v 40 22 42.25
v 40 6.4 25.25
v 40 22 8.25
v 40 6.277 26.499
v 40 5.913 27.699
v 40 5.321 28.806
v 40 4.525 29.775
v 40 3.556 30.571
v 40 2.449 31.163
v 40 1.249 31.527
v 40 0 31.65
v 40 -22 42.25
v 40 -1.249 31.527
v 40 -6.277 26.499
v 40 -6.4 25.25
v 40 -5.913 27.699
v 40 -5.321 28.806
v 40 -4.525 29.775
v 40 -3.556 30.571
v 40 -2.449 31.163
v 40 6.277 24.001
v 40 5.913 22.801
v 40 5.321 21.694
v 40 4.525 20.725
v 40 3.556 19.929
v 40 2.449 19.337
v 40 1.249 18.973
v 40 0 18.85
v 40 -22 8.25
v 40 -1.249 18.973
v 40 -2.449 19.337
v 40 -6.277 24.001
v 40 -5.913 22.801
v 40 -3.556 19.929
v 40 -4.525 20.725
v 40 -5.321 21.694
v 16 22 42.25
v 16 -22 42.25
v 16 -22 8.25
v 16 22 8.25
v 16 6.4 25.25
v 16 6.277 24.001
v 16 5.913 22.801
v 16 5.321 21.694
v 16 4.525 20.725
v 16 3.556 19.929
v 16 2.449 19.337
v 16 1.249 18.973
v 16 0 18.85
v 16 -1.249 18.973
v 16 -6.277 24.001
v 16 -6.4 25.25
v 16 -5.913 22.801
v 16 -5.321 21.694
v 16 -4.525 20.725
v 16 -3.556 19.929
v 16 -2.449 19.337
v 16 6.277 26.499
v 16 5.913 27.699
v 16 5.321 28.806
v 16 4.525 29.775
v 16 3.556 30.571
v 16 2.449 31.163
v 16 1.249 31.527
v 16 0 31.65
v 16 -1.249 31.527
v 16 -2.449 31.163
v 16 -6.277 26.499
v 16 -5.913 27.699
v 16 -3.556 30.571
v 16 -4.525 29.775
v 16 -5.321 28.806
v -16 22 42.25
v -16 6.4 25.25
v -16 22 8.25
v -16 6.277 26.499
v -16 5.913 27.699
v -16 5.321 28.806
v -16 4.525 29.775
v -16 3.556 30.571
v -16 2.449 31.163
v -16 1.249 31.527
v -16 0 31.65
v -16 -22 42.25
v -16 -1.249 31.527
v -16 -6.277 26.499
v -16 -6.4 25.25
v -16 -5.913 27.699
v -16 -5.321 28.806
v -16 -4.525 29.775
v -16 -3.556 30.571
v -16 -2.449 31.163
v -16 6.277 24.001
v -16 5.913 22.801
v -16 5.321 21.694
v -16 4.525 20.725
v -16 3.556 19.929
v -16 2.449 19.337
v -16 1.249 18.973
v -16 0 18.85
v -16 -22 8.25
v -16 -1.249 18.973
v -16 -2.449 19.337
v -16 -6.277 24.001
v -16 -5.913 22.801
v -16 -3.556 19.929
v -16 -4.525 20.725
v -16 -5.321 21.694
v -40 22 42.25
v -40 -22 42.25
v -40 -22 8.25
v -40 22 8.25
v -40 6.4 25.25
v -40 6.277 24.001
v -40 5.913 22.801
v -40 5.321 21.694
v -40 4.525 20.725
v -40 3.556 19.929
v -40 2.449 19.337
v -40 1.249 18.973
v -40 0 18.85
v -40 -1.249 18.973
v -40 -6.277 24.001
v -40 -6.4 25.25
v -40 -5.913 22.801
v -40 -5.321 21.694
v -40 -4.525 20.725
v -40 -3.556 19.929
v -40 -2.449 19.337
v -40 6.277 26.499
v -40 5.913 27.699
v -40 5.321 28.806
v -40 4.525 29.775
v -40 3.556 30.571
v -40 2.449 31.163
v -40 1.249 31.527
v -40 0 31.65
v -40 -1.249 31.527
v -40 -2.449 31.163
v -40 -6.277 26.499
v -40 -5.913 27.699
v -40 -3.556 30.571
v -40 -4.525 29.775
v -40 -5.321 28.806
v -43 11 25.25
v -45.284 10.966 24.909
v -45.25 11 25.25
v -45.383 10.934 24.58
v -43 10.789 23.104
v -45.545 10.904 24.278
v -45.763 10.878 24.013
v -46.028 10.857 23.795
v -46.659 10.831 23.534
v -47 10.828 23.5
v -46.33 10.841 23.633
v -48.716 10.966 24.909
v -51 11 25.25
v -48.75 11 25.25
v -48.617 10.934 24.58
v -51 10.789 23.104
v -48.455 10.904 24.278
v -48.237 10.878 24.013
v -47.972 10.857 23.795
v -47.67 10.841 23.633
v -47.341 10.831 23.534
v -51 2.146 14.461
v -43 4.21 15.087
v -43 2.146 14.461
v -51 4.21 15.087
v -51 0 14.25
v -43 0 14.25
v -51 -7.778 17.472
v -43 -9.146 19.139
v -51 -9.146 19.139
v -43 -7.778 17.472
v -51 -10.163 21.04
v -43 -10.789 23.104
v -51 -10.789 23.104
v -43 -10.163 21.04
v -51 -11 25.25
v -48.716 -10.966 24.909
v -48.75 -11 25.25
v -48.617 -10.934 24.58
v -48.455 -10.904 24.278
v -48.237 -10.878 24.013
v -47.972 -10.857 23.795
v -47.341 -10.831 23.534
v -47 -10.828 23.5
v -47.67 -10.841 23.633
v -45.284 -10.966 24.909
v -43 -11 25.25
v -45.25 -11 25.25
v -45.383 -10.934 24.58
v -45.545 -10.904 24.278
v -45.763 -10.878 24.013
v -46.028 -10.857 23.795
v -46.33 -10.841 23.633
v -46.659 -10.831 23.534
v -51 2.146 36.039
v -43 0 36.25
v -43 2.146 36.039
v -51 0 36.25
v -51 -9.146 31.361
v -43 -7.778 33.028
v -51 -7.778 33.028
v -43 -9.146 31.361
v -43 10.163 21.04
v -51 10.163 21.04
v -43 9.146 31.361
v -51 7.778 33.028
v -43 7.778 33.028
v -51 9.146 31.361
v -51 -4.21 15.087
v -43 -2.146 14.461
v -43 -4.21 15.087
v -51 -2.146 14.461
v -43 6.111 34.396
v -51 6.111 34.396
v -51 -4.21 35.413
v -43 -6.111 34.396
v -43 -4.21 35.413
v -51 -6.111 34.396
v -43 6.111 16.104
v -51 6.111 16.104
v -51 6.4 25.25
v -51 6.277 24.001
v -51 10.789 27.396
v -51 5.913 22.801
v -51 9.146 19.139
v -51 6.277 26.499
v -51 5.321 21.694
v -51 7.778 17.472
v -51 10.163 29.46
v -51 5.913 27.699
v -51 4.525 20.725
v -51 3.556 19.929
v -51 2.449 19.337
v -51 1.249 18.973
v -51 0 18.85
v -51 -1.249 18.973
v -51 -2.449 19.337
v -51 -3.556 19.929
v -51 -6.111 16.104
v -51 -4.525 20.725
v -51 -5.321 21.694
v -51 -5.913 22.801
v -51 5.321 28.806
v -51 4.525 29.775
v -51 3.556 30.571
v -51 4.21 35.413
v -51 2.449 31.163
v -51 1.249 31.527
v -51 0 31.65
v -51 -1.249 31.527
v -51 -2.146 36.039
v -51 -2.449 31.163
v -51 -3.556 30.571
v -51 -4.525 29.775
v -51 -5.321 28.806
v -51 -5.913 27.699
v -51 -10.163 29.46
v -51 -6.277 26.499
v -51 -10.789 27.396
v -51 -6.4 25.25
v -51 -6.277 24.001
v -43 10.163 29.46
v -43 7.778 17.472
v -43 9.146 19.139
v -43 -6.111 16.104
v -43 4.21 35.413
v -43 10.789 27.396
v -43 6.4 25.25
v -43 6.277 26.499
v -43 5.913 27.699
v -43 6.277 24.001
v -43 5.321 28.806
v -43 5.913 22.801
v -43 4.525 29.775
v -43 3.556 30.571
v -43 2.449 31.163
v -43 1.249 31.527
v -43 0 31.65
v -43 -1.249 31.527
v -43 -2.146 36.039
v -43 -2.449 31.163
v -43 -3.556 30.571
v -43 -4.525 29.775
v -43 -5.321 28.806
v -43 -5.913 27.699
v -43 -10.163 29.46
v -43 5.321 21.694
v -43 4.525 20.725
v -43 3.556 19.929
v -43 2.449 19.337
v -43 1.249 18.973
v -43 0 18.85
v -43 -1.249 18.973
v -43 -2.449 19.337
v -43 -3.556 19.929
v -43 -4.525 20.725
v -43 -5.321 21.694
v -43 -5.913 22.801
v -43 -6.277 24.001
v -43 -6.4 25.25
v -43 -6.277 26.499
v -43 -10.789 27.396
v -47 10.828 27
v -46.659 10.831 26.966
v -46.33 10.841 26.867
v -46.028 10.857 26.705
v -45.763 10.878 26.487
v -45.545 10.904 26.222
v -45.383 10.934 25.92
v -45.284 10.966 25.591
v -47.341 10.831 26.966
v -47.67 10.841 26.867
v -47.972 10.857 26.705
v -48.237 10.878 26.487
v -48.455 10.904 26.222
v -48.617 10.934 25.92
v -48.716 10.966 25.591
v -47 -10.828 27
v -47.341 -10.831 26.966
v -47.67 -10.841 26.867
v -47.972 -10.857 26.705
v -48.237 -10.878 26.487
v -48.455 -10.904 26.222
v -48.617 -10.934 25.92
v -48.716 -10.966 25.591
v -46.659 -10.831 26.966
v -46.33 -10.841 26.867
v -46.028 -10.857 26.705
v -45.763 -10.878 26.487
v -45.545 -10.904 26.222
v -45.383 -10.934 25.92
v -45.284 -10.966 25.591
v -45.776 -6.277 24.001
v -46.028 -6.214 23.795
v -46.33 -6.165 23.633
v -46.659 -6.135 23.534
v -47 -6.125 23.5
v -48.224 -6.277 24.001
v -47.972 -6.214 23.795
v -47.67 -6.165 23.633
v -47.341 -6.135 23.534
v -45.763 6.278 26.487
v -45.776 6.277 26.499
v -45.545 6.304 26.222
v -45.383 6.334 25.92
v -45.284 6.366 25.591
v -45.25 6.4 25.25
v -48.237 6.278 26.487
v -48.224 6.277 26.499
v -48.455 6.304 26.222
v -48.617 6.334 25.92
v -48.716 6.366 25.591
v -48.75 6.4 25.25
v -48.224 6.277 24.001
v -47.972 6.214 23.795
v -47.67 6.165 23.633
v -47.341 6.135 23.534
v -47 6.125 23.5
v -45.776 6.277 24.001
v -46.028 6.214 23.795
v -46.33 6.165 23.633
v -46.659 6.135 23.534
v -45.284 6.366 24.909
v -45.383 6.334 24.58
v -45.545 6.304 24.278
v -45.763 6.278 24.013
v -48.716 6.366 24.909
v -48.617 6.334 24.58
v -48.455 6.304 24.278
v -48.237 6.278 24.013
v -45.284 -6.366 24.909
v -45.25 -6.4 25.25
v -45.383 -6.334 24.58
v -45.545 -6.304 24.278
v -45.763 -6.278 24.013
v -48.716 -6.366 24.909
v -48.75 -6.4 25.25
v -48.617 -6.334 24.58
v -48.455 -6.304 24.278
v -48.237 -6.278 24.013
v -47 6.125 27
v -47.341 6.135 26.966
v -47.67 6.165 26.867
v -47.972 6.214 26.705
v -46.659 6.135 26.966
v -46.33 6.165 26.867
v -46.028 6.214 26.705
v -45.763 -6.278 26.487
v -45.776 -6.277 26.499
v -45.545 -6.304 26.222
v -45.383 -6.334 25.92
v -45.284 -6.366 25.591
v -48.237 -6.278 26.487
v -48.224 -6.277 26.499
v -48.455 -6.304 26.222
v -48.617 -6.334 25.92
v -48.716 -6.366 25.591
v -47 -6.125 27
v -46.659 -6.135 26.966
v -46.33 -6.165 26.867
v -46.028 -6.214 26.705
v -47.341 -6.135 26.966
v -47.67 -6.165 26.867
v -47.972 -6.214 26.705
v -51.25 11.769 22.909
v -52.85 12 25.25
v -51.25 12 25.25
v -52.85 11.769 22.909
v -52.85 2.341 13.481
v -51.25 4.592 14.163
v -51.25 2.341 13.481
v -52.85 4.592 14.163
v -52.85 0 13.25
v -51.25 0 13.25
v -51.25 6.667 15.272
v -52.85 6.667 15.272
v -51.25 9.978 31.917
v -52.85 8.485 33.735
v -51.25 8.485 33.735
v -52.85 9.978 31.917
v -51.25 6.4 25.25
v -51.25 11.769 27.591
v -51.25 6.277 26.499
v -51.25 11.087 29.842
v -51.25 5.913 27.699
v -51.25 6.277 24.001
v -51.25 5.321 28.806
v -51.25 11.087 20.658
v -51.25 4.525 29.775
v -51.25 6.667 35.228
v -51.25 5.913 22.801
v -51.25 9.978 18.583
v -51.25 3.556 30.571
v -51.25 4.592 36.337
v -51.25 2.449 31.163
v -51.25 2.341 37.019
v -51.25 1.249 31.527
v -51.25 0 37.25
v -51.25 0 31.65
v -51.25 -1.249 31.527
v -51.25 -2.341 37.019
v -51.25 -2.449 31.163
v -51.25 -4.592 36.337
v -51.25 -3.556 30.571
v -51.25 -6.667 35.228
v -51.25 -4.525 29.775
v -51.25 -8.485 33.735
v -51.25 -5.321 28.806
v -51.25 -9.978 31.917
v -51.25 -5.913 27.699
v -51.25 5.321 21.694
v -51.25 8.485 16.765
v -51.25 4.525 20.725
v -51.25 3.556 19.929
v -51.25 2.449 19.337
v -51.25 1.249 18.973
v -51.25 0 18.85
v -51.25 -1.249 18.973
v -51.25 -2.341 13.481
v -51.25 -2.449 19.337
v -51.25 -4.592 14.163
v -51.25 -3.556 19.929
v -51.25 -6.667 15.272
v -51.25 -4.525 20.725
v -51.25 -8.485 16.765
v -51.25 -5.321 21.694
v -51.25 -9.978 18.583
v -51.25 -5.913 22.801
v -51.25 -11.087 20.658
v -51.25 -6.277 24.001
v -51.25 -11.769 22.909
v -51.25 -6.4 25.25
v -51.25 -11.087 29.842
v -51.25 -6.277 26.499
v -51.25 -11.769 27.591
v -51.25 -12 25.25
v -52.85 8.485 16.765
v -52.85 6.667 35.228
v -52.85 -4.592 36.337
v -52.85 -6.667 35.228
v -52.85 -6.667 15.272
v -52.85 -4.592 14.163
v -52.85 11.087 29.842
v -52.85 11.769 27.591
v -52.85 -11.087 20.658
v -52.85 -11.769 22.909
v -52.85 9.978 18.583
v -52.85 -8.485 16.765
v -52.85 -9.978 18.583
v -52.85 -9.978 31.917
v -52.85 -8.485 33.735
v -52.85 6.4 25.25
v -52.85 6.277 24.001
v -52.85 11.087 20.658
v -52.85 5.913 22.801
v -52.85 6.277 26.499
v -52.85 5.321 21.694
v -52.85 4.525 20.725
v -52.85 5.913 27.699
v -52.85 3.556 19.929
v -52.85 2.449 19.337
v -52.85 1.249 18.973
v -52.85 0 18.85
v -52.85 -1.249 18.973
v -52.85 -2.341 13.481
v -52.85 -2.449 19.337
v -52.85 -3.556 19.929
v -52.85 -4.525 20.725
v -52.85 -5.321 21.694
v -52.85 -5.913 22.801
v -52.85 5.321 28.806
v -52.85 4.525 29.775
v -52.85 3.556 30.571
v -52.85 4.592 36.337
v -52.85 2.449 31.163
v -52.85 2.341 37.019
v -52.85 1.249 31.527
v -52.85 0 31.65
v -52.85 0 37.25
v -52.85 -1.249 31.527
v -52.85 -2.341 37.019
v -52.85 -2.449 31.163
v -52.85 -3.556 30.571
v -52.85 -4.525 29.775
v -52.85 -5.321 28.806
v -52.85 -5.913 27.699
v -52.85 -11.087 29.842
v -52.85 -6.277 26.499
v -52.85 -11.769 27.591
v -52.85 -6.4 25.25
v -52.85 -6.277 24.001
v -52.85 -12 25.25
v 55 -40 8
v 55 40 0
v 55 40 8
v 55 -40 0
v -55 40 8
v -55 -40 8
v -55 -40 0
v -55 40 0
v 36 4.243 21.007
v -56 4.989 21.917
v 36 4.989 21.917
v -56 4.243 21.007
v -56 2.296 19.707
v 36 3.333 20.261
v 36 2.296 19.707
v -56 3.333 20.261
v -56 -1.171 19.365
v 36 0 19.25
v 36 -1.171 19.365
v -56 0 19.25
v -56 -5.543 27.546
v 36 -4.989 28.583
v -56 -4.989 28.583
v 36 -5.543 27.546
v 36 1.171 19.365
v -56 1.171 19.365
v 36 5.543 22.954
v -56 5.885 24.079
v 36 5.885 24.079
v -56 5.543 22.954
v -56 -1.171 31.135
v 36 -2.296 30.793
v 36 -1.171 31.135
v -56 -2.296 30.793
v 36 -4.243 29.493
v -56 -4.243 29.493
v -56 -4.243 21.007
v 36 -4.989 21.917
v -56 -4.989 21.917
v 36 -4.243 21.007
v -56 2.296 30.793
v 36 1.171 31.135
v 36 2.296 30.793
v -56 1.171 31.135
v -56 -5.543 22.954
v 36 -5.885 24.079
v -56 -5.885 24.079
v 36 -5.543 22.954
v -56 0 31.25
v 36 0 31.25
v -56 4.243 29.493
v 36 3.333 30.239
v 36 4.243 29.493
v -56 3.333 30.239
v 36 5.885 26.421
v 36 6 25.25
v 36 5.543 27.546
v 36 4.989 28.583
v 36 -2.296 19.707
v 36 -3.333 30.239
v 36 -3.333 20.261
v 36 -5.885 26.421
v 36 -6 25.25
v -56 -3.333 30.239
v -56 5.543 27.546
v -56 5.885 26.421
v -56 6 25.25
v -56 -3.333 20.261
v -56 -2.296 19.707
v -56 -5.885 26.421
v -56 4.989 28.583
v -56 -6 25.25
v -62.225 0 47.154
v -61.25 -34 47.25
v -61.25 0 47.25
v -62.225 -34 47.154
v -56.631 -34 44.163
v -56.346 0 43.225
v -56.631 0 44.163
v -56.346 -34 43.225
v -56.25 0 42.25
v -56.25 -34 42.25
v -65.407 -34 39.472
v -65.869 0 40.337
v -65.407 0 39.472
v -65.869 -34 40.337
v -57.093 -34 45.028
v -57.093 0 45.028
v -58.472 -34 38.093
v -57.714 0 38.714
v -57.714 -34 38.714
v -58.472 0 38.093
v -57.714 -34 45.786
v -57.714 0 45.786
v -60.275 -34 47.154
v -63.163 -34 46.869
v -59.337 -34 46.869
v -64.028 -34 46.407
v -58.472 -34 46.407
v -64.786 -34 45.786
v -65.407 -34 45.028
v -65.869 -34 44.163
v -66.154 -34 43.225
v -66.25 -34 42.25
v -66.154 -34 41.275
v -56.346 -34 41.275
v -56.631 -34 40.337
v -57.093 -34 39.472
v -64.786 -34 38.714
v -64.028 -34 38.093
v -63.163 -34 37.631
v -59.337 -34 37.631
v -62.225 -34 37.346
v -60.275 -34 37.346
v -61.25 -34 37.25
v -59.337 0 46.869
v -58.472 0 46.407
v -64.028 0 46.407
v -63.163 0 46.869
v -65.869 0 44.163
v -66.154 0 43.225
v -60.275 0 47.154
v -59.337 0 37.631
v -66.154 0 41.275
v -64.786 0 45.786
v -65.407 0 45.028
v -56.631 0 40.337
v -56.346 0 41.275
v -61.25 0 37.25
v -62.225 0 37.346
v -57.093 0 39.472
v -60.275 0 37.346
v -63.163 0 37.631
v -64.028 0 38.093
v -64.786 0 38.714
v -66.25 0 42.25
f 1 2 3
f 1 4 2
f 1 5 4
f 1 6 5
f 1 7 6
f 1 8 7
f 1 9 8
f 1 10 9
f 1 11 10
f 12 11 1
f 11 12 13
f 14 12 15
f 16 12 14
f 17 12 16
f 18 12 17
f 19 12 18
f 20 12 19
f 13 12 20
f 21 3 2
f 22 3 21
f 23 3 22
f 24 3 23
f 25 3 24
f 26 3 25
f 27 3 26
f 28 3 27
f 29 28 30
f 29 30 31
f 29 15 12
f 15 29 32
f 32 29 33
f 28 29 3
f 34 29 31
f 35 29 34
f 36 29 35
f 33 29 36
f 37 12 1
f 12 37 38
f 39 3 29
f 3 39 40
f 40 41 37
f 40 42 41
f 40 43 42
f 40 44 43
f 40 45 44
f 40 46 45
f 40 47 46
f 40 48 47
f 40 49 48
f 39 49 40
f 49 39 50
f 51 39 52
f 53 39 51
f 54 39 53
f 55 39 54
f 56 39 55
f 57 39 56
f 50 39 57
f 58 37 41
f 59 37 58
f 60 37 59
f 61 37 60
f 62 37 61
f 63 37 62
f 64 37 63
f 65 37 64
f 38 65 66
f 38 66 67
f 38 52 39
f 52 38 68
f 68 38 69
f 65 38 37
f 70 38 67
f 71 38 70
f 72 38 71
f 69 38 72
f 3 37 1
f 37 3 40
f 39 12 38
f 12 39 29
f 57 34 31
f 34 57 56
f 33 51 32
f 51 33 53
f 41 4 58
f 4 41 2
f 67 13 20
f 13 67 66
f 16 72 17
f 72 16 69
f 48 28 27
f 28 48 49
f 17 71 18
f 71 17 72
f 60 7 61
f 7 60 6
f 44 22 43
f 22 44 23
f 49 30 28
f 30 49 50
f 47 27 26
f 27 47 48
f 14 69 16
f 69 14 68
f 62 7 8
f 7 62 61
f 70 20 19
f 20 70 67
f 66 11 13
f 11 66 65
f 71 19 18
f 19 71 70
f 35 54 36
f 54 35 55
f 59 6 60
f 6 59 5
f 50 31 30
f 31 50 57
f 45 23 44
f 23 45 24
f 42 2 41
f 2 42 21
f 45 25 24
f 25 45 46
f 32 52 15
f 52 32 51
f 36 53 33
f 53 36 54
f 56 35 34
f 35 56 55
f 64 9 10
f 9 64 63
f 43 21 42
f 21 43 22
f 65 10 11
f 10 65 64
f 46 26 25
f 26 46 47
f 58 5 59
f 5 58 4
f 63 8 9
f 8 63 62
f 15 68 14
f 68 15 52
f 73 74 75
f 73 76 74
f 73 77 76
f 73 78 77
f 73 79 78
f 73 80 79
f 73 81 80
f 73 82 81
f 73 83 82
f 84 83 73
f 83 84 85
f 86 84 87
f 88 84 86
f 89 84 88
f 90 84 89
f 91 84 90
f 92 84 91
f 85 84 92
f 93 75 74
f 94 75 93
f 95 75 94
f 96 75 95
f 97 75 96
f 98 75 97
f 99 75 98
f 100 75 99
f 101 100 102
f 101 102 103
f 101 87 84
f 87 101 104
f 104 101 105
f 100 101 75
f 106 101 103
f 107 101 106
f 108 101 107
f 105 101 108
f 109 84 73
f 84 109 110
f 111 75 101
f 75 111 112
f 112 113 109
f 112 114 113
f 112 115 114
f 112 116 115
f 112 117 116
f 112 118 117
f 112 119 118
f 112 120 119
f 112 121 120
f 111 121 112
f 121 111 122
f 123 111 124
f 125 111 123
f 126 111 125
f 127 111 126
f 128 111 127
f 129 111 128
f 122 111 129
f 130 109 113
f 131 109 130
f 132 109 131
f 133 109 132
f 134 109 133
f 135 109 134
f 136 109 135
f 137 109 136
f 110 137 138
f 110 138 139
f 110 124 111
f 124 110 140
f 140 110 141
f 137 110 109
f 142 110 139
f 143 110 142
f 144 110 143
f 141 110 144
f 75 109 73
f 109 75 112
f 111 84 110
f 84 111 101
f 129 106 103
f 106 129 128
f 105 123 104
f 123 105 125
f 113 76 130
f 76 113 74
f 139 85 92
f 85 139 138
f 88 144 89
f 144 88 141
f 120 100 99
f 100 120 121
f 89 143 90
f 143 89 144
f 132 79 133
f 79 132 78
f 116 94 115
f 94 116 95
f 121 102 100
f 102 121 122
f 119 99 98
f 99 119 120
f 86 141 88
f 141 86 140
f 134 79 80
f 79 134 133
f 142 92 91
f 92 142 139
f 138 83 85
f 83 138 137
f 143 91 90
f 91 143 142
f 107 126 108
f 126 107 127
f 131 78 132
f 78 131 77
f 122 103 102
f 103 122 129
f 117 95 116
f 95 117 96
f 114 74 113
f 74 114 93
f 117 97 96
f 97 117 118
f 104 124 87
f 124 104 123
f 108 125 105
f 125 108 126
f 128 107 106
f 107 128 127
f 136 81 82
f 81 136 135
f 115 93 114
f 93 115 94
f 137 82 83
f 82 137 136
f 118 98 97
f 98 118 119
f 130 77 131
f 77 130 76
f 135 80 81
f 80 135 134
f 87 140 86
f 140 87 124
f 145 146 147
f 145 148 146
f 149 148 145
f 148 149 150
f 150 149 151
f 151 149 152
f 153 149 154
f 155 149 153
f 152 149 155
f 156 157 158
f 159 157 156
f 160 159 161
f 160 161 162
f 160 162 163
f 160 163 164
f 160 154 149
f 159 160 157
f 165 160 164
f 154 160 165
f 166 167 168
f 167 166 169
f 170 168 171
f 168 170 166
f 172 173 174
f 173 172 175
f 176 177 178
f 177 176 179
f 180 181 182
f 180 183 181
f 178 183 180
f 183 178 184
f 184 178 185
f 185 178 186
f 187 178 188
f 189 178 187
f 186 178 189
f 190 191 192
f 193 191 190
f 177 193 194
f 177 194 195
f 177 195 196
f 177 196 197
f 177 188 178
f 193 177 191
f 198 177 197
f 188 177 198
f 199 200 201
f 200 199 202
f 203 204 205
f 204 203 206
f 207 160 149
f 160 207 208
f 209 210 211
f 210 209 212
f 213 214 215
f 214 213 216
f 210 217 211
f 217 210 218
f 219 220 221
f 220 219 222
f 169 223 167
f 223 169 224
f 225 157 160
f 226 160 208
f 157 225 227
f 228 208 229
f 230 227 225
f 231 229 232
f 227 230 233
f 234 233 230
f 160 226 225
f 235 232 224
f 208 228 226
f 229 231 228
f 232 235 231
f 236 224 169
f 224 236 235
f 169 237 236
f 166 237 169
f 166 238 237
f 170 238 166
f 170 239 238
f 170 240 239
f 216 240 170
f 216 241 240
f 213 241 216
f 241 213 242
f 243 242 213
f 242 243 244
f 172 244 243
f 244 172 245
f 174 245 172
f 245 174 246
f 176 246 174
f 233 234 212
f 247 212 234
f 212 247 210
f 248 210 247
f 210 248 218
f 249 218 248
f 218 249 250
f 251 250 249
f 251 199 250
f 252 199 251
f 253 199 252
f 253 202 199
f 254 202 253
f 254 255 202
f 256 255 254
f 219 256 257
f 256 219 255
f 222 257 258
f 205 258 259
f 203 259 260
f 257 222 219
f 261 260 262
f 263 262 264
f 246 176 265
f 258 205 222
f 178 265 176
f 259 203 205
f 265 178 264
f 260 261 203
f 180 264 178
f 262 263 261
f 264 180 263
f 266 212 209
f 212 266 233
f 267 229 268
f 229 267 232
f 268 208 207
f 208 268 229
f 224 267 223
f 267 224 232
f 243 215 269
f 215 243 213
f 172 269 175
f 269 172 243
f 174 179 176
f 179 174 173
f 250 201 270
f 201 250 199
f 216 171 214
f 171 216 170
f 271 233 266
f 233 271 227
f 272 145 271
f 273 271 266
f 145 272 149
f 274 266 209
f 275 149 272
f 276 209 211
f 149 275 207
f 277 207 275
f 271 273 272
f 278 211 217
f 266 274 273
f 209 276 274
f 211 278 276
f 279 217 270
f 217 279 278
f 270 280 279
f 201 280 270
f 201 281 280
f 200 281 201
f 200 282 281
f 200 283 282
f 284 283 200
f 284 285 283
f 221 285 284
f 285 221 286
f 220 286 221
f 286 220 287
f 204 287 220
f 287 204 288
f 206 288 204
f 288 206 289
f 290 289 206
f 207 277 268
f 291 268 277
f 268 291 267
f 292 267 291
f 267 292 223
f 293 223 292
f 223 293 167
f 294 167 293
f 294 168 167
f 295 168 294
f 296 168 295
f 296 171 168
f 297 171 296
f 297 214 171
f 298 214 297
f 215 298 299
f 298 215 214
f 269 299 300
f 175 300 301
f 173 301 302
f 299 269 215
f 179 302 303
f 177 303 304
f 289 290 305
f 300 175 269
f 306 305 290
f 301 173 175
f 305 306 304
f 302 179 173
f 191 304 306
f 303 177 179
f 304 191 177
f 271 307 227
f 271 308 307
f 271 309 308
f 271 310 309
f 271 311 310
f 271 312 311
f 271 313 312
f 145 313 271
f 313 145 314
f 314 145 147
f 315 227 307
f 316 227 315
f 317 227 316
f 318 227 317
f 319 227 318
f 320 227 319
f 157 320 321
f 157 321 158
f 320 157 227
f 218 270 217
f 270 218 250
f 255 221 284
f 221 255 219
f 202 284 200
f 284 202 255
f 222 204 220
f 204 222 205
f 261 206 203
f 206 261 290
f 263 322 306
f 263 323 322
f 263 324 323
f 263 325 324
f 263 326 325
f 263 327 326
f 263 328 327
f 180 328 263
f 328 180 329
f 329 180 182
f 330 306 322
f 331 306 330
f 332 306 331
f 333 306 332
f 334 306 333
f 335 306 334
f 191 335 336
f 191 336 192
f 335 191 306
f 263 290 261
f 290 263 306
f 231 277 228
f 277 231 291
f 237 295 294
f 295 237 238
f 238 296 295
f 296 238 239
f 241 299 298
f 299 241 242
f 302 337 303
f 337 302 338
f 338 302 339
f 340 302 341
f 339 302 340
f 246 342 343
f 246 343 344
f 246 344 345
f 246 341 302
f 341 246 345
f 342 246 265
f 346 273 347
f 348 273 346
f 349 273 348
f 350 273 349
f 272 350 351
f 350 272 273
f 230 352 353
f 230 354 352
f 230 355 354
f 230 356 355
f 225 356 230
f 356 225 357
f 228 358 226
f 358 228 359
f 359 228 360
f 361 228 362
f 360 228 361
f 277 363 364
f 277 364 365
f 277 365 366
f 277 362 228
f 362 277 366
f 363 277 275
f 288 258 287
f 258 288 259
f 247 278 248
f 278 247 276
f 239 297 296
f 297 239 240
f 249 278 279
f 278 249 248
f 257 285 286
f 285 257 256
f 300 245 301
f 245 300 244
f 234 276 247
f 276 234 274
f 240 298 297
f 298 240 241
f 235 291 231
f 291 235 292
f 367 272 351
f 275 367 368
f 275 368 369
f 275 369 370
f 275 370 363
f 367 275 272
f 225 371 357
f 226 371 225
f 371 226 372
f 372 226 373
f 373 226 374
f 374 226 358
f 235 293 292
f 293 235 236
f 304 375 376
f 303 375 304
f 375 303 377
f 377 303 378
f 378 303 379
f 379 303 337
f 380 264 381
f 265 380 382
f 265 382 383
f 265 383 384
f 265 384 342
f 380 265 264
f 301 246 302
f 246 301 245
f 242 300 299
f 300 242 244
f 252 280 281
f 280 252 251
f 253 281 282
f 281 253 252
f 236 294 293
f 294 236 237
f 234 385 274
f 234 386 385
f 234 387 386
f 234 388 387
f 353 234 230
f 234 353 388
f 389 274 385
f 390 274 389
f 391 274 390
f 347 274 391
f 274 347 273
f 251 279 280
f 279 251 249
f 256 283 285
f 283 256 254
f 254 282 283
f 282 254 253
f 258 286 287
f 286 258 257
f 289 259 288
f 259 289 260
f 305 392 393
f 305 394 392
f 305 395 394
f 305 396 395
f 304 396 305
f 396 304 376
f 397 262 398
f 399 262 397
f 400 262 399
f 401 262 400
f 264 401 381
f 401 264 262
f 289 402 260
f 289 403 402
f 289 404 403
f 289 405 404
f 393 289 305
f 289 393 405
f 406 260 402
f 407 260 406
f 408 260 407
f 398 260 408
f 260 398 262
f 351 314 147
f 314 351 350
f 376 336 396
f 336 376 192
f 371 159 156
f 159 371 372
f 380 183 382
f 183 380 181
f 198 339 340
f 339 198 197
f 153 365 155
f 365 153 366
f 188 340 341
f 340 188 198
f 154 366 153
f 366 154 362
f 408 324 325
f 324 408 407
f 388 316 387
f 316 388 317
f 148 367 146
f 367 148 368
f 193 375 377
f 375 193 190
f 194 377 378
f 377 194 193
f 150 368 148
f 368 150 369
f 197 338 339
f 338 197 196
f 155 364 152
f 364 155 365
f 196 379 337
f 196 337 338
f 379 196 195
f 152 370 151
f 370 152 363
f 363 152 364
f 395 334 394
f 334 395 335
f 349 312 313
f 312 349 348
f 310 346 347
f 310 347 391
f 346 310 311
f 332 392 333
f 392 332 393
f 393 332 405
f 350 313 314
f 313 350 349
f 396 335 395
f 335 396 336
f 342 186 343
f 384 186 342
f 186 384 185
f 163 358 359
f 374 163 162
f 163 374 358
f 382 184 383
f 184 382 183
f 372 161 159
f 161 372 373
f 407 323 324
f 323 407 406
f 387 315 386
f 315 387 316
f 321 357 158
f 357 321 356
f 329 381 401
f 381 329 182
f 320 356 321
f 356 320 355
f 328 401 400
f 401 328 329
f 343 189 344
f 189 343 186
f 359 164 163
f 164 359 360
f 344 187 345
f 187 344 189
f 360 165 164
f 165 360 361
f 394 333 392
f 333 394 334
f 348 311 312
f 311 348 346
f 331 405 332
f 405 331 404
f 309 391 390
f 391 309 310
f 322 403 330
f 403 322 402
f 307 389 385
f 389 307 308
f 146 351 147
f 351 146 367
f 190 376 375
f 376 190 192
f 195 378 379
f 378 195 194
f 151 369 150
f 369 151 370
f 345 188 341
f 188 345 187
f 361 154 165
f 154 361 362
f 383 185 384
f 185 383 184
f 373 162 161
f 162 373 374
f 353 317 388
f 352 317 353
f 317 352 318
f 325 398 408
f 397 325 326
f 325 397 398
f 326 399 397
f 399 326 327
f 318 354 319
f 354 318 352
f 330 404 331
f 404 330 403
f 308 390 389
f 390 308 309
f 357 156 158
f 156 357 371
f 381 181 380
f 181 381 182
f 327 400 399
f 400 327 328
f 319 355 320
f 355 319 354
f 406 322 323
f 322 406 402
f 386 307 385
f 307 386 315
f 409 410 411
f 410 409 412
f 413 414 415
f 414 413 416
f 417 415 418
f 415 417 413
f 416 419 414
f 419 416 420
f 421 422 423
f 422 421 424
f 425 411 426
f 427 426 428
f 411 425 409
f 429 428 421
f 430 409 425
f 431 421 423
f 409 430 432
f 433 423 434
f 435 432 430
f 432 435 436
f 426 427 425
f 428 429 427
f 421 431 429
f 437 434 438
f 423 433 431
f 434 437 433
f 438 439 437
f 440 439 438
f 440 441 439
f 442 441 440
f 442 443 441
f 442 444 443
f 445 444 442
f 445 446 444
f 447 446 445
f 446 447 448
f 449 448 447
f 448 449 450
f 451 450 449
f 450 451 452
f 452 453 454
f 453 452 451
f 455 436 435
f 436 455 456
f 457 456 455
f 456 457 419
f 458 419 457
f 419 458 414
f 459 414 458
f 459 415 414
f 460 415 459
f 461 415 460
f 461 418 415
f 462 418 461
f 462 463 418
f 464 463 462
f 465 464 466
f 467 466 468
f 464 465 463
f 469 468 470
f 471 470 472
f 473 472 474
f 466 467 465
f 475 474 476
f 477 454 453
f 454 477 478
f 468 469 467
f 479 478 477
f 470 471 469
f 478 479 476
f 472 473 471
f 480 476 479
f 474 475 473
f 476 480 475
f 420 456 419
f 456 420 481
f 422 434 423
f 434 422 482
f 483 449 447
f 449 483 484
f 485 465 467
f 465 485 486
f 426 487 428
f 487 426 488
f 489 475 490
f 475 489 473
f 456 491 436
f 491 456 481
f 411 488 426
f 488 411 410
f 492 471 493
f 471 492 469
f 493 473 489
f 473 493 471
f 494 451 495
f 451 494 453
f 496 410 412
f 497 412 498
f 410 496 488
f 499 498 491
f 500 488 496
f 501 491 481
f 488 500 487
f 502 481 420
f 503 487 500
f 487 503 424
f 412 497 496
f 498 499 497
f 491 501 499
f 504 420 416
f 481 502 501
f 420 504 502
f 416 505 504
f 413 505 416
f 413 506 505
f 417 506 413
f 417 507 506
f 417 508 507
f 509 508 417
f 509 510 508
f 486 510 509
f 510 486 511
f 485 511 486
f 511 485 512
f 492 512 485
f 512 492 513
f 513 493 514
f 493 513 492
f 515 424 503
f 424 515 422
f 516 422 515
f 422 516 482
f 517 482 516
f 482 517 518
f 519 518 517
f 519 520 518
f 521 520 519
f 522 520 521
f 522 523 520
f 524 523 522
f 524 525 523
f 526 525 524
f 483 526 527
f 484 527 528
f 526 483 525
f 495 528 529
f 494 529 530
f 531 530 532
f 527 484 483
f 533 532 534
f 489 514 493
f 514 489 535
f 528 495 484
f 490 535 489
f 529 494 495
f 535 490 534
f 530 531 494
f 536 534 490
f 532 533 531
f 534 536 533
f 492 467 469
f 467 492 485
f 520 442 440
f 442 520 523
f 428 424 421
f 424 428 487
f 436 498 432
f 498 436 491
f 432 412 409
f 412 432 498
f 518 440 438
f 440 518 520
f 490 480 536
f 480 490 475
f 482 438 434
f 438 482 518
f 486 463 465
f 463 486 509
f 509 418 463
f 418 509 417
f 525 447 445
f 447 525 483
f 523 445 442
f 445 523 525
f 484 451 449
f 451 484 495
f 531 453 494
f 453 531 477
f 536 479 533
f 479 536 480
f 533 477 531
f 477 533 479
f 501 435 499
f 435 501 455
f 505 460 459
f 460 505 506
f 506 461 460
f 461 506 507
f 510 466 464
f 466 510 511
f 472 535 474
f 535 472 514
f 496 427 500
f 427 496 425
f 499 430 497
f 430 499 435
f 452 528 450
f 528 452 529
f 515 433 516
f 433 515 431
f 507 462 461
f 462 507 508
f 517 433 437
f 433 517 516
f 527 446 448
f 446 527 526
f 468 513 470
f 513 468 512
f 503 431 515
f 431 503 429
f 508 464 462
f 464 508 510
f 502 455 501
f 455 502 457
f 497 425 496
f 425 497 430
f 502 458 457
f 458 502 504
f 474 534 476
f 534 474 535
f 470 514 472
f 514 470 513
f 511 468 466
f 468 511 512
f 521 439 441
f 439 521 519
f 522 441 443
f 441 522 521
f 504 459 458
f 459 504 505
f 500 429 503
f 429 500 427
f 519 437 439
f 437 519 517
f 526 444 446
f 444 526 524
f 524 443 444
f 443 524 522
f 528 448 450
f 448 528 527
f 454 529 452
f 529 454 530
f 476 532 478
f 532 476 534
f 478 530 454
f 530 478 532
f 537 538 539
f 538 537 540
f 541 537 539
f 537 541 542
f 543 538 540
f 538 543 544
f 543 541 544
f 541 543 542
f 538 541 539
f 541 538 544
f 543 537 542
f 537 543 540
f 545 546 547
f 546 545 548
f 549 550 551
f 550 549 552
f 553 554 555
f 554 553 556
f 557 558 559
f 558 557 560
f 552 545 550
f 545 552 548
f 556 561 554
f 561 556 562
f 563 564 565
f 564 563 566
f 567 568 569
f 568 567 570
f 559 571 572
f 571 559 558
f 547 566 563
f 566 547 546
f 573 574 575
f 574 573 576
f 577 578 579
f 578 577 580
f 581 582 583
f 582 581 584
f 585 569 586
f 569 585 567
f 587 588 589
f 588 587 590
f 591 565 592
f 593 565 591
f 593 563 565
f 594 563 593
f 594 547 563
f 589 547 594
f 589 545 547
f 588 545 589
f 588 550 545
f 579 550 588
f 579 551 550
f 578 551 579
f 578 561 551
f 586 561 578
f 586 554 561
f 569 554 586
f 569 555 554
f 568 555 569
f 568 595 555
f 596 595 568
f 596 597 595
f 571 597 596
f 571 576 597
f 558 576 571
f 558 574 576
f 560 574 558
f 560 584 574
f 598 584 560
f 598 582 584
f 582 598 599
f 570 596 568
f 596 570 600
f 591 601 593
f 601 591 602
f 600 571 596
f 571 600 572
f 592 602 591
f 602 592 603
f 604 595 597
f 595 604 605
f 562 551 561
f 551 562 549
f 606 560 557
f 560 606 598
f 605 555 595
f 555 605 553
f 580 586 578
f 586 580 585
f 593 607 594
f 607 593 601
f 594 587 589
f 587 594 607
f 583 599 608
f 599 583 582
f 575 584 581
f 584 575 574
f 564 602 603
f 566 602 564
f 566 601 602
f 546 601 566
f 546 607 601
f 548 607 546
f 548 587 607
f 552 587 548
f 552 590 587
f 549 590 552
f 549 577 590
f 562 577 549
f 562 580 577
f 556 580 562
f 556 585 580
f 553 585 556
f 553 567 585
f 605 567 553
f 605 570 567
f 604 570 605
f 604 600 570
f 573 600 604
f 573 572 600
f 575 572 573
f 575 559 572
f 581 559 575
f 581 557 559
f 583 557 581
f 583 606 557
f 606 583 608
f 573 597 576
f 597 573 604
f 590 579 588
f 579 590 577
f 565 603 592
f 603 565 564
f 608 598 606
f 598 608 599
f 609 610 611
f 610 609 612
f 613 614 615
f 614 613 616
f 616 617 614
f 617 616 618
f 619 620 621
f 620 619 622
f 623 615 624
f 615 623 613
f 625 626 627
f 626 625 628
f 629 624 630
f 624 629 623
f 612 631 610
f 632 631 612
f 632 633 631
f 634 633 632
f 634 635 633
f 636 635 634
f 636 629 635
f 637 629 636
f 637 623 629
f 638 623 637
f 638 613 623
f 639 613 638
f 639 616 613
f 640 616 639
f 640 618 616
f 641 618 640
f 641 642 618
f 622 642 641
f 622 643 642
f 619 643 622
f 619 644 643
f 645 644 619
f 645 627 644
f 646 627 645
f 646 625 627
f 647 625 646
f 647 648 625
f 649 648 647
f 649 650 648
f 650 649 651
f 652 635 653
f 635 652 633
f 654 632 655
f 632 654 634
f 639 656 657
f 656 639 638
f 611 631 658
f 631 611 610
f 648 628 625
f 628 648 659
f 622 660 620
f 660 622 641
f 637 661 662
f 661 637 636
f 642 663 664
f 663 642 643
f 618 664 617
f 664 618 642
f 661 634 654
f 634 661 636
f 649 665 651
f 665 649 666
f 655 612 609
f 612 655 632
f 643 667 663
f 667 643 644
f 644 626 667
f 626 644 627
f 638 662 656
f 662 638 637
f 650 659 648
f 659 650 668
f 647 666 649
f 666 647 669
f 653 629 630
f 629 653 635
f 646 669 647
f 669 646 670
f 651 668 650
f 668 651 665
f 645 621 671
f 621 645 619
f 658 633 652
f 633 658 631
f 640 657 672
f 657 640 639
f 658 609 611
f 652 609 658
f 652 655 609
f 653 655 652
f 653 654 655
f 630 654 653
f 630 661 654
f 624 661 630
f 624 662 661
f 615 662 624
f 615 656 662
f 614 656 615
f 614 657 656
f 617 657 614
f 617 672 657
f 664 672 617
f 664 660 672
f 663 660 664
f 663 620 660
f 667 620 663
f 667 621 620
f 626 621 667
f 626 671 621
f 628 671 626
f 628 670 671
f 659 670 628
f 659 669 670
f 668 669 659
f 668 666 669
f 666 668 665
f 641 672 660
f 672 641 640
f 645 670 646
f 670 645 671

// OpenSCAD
$fn = 32;

// ------------------------------------------------------------------------
// Machine vise: screw d12, jaws 24 x 34 mm
// Every part is its own module, assembly() places every instance.
// ------------------------------------------------------------------------

// --- part 1 ---
module vise_bed() {
  difference() {
    translate([-55, -40, 0]) cube([110, 80, 8]);
  }
}

// --- part 2 ---
module vise_jaw() {
  difference() {
    translate([-12, -22, 0]) cube([24, 44, 34]);
    translate([0, 0, 17]) rotate([0, 90, 0]) cylinder(h = 26, d = 12.8, center = true);
  }
}

// --- part 3 ---
module vise_screw() {
  translate([0, 0, -46]) cylinder(h = 92, d = 12);
}

// --- part 4 ---
module screw_collar() {
  difference() {
    cylinder(h = 8, d = 22);
    translate([0, 0, -1]) cylinder(h = 10, d = 12.8);
    translate([0, 0, 4]) rotate([90, 0, 0]) cylinder(h = 24, d = 3.5, center = true);
  }
}

// --- part 5 ---
module screw_washer() {
  difference() {
      translate([0, 0, 0]) cylinder(h = 1.6, d = 24);
      translate([0, 0, -1]) cylinder(h = 3.6, d = 12.8);
    }
}

// --- part 6 ---
module vise_handle() {
  cylinder(h = 34, d = 10);
}

// --- assembly ---
module assembly() {
  color([0.80, 0.24, 0.20]) translate([0, 0, 0]) rotate([0, 0, 0]) vise_bed();
  color([0.20, 0.45, 0.75]) translate([28, 0, 8.25]) rotate([0, 0, 0]) vise_jaw();
  color([0.25, 0.62, 0.32]) translate([-28, 0, 8.25]) rotate([0, 0, 0]) vise_jaw();
  color([0.92, 0.70, 0.18]) translate([-10, 0, 25.25]) rotate([0, 90, 0]) vise_screw();
  color([0.58, 0.35, 0.70]) translate([-51, 0, 25.25]) rotate([0, 90, 0]) screw_collar();
  color([0.16, 0.66, 0.66]) translate([-52.85, 0, 25.25]) rotate([0, 90, 0]) screw_washer();
  color([0.85, 0.48, 0.18]) translate([-61.25, 0, 42.25]) rotate([90, 0, 0]) vise_handle();
}

assembly();
